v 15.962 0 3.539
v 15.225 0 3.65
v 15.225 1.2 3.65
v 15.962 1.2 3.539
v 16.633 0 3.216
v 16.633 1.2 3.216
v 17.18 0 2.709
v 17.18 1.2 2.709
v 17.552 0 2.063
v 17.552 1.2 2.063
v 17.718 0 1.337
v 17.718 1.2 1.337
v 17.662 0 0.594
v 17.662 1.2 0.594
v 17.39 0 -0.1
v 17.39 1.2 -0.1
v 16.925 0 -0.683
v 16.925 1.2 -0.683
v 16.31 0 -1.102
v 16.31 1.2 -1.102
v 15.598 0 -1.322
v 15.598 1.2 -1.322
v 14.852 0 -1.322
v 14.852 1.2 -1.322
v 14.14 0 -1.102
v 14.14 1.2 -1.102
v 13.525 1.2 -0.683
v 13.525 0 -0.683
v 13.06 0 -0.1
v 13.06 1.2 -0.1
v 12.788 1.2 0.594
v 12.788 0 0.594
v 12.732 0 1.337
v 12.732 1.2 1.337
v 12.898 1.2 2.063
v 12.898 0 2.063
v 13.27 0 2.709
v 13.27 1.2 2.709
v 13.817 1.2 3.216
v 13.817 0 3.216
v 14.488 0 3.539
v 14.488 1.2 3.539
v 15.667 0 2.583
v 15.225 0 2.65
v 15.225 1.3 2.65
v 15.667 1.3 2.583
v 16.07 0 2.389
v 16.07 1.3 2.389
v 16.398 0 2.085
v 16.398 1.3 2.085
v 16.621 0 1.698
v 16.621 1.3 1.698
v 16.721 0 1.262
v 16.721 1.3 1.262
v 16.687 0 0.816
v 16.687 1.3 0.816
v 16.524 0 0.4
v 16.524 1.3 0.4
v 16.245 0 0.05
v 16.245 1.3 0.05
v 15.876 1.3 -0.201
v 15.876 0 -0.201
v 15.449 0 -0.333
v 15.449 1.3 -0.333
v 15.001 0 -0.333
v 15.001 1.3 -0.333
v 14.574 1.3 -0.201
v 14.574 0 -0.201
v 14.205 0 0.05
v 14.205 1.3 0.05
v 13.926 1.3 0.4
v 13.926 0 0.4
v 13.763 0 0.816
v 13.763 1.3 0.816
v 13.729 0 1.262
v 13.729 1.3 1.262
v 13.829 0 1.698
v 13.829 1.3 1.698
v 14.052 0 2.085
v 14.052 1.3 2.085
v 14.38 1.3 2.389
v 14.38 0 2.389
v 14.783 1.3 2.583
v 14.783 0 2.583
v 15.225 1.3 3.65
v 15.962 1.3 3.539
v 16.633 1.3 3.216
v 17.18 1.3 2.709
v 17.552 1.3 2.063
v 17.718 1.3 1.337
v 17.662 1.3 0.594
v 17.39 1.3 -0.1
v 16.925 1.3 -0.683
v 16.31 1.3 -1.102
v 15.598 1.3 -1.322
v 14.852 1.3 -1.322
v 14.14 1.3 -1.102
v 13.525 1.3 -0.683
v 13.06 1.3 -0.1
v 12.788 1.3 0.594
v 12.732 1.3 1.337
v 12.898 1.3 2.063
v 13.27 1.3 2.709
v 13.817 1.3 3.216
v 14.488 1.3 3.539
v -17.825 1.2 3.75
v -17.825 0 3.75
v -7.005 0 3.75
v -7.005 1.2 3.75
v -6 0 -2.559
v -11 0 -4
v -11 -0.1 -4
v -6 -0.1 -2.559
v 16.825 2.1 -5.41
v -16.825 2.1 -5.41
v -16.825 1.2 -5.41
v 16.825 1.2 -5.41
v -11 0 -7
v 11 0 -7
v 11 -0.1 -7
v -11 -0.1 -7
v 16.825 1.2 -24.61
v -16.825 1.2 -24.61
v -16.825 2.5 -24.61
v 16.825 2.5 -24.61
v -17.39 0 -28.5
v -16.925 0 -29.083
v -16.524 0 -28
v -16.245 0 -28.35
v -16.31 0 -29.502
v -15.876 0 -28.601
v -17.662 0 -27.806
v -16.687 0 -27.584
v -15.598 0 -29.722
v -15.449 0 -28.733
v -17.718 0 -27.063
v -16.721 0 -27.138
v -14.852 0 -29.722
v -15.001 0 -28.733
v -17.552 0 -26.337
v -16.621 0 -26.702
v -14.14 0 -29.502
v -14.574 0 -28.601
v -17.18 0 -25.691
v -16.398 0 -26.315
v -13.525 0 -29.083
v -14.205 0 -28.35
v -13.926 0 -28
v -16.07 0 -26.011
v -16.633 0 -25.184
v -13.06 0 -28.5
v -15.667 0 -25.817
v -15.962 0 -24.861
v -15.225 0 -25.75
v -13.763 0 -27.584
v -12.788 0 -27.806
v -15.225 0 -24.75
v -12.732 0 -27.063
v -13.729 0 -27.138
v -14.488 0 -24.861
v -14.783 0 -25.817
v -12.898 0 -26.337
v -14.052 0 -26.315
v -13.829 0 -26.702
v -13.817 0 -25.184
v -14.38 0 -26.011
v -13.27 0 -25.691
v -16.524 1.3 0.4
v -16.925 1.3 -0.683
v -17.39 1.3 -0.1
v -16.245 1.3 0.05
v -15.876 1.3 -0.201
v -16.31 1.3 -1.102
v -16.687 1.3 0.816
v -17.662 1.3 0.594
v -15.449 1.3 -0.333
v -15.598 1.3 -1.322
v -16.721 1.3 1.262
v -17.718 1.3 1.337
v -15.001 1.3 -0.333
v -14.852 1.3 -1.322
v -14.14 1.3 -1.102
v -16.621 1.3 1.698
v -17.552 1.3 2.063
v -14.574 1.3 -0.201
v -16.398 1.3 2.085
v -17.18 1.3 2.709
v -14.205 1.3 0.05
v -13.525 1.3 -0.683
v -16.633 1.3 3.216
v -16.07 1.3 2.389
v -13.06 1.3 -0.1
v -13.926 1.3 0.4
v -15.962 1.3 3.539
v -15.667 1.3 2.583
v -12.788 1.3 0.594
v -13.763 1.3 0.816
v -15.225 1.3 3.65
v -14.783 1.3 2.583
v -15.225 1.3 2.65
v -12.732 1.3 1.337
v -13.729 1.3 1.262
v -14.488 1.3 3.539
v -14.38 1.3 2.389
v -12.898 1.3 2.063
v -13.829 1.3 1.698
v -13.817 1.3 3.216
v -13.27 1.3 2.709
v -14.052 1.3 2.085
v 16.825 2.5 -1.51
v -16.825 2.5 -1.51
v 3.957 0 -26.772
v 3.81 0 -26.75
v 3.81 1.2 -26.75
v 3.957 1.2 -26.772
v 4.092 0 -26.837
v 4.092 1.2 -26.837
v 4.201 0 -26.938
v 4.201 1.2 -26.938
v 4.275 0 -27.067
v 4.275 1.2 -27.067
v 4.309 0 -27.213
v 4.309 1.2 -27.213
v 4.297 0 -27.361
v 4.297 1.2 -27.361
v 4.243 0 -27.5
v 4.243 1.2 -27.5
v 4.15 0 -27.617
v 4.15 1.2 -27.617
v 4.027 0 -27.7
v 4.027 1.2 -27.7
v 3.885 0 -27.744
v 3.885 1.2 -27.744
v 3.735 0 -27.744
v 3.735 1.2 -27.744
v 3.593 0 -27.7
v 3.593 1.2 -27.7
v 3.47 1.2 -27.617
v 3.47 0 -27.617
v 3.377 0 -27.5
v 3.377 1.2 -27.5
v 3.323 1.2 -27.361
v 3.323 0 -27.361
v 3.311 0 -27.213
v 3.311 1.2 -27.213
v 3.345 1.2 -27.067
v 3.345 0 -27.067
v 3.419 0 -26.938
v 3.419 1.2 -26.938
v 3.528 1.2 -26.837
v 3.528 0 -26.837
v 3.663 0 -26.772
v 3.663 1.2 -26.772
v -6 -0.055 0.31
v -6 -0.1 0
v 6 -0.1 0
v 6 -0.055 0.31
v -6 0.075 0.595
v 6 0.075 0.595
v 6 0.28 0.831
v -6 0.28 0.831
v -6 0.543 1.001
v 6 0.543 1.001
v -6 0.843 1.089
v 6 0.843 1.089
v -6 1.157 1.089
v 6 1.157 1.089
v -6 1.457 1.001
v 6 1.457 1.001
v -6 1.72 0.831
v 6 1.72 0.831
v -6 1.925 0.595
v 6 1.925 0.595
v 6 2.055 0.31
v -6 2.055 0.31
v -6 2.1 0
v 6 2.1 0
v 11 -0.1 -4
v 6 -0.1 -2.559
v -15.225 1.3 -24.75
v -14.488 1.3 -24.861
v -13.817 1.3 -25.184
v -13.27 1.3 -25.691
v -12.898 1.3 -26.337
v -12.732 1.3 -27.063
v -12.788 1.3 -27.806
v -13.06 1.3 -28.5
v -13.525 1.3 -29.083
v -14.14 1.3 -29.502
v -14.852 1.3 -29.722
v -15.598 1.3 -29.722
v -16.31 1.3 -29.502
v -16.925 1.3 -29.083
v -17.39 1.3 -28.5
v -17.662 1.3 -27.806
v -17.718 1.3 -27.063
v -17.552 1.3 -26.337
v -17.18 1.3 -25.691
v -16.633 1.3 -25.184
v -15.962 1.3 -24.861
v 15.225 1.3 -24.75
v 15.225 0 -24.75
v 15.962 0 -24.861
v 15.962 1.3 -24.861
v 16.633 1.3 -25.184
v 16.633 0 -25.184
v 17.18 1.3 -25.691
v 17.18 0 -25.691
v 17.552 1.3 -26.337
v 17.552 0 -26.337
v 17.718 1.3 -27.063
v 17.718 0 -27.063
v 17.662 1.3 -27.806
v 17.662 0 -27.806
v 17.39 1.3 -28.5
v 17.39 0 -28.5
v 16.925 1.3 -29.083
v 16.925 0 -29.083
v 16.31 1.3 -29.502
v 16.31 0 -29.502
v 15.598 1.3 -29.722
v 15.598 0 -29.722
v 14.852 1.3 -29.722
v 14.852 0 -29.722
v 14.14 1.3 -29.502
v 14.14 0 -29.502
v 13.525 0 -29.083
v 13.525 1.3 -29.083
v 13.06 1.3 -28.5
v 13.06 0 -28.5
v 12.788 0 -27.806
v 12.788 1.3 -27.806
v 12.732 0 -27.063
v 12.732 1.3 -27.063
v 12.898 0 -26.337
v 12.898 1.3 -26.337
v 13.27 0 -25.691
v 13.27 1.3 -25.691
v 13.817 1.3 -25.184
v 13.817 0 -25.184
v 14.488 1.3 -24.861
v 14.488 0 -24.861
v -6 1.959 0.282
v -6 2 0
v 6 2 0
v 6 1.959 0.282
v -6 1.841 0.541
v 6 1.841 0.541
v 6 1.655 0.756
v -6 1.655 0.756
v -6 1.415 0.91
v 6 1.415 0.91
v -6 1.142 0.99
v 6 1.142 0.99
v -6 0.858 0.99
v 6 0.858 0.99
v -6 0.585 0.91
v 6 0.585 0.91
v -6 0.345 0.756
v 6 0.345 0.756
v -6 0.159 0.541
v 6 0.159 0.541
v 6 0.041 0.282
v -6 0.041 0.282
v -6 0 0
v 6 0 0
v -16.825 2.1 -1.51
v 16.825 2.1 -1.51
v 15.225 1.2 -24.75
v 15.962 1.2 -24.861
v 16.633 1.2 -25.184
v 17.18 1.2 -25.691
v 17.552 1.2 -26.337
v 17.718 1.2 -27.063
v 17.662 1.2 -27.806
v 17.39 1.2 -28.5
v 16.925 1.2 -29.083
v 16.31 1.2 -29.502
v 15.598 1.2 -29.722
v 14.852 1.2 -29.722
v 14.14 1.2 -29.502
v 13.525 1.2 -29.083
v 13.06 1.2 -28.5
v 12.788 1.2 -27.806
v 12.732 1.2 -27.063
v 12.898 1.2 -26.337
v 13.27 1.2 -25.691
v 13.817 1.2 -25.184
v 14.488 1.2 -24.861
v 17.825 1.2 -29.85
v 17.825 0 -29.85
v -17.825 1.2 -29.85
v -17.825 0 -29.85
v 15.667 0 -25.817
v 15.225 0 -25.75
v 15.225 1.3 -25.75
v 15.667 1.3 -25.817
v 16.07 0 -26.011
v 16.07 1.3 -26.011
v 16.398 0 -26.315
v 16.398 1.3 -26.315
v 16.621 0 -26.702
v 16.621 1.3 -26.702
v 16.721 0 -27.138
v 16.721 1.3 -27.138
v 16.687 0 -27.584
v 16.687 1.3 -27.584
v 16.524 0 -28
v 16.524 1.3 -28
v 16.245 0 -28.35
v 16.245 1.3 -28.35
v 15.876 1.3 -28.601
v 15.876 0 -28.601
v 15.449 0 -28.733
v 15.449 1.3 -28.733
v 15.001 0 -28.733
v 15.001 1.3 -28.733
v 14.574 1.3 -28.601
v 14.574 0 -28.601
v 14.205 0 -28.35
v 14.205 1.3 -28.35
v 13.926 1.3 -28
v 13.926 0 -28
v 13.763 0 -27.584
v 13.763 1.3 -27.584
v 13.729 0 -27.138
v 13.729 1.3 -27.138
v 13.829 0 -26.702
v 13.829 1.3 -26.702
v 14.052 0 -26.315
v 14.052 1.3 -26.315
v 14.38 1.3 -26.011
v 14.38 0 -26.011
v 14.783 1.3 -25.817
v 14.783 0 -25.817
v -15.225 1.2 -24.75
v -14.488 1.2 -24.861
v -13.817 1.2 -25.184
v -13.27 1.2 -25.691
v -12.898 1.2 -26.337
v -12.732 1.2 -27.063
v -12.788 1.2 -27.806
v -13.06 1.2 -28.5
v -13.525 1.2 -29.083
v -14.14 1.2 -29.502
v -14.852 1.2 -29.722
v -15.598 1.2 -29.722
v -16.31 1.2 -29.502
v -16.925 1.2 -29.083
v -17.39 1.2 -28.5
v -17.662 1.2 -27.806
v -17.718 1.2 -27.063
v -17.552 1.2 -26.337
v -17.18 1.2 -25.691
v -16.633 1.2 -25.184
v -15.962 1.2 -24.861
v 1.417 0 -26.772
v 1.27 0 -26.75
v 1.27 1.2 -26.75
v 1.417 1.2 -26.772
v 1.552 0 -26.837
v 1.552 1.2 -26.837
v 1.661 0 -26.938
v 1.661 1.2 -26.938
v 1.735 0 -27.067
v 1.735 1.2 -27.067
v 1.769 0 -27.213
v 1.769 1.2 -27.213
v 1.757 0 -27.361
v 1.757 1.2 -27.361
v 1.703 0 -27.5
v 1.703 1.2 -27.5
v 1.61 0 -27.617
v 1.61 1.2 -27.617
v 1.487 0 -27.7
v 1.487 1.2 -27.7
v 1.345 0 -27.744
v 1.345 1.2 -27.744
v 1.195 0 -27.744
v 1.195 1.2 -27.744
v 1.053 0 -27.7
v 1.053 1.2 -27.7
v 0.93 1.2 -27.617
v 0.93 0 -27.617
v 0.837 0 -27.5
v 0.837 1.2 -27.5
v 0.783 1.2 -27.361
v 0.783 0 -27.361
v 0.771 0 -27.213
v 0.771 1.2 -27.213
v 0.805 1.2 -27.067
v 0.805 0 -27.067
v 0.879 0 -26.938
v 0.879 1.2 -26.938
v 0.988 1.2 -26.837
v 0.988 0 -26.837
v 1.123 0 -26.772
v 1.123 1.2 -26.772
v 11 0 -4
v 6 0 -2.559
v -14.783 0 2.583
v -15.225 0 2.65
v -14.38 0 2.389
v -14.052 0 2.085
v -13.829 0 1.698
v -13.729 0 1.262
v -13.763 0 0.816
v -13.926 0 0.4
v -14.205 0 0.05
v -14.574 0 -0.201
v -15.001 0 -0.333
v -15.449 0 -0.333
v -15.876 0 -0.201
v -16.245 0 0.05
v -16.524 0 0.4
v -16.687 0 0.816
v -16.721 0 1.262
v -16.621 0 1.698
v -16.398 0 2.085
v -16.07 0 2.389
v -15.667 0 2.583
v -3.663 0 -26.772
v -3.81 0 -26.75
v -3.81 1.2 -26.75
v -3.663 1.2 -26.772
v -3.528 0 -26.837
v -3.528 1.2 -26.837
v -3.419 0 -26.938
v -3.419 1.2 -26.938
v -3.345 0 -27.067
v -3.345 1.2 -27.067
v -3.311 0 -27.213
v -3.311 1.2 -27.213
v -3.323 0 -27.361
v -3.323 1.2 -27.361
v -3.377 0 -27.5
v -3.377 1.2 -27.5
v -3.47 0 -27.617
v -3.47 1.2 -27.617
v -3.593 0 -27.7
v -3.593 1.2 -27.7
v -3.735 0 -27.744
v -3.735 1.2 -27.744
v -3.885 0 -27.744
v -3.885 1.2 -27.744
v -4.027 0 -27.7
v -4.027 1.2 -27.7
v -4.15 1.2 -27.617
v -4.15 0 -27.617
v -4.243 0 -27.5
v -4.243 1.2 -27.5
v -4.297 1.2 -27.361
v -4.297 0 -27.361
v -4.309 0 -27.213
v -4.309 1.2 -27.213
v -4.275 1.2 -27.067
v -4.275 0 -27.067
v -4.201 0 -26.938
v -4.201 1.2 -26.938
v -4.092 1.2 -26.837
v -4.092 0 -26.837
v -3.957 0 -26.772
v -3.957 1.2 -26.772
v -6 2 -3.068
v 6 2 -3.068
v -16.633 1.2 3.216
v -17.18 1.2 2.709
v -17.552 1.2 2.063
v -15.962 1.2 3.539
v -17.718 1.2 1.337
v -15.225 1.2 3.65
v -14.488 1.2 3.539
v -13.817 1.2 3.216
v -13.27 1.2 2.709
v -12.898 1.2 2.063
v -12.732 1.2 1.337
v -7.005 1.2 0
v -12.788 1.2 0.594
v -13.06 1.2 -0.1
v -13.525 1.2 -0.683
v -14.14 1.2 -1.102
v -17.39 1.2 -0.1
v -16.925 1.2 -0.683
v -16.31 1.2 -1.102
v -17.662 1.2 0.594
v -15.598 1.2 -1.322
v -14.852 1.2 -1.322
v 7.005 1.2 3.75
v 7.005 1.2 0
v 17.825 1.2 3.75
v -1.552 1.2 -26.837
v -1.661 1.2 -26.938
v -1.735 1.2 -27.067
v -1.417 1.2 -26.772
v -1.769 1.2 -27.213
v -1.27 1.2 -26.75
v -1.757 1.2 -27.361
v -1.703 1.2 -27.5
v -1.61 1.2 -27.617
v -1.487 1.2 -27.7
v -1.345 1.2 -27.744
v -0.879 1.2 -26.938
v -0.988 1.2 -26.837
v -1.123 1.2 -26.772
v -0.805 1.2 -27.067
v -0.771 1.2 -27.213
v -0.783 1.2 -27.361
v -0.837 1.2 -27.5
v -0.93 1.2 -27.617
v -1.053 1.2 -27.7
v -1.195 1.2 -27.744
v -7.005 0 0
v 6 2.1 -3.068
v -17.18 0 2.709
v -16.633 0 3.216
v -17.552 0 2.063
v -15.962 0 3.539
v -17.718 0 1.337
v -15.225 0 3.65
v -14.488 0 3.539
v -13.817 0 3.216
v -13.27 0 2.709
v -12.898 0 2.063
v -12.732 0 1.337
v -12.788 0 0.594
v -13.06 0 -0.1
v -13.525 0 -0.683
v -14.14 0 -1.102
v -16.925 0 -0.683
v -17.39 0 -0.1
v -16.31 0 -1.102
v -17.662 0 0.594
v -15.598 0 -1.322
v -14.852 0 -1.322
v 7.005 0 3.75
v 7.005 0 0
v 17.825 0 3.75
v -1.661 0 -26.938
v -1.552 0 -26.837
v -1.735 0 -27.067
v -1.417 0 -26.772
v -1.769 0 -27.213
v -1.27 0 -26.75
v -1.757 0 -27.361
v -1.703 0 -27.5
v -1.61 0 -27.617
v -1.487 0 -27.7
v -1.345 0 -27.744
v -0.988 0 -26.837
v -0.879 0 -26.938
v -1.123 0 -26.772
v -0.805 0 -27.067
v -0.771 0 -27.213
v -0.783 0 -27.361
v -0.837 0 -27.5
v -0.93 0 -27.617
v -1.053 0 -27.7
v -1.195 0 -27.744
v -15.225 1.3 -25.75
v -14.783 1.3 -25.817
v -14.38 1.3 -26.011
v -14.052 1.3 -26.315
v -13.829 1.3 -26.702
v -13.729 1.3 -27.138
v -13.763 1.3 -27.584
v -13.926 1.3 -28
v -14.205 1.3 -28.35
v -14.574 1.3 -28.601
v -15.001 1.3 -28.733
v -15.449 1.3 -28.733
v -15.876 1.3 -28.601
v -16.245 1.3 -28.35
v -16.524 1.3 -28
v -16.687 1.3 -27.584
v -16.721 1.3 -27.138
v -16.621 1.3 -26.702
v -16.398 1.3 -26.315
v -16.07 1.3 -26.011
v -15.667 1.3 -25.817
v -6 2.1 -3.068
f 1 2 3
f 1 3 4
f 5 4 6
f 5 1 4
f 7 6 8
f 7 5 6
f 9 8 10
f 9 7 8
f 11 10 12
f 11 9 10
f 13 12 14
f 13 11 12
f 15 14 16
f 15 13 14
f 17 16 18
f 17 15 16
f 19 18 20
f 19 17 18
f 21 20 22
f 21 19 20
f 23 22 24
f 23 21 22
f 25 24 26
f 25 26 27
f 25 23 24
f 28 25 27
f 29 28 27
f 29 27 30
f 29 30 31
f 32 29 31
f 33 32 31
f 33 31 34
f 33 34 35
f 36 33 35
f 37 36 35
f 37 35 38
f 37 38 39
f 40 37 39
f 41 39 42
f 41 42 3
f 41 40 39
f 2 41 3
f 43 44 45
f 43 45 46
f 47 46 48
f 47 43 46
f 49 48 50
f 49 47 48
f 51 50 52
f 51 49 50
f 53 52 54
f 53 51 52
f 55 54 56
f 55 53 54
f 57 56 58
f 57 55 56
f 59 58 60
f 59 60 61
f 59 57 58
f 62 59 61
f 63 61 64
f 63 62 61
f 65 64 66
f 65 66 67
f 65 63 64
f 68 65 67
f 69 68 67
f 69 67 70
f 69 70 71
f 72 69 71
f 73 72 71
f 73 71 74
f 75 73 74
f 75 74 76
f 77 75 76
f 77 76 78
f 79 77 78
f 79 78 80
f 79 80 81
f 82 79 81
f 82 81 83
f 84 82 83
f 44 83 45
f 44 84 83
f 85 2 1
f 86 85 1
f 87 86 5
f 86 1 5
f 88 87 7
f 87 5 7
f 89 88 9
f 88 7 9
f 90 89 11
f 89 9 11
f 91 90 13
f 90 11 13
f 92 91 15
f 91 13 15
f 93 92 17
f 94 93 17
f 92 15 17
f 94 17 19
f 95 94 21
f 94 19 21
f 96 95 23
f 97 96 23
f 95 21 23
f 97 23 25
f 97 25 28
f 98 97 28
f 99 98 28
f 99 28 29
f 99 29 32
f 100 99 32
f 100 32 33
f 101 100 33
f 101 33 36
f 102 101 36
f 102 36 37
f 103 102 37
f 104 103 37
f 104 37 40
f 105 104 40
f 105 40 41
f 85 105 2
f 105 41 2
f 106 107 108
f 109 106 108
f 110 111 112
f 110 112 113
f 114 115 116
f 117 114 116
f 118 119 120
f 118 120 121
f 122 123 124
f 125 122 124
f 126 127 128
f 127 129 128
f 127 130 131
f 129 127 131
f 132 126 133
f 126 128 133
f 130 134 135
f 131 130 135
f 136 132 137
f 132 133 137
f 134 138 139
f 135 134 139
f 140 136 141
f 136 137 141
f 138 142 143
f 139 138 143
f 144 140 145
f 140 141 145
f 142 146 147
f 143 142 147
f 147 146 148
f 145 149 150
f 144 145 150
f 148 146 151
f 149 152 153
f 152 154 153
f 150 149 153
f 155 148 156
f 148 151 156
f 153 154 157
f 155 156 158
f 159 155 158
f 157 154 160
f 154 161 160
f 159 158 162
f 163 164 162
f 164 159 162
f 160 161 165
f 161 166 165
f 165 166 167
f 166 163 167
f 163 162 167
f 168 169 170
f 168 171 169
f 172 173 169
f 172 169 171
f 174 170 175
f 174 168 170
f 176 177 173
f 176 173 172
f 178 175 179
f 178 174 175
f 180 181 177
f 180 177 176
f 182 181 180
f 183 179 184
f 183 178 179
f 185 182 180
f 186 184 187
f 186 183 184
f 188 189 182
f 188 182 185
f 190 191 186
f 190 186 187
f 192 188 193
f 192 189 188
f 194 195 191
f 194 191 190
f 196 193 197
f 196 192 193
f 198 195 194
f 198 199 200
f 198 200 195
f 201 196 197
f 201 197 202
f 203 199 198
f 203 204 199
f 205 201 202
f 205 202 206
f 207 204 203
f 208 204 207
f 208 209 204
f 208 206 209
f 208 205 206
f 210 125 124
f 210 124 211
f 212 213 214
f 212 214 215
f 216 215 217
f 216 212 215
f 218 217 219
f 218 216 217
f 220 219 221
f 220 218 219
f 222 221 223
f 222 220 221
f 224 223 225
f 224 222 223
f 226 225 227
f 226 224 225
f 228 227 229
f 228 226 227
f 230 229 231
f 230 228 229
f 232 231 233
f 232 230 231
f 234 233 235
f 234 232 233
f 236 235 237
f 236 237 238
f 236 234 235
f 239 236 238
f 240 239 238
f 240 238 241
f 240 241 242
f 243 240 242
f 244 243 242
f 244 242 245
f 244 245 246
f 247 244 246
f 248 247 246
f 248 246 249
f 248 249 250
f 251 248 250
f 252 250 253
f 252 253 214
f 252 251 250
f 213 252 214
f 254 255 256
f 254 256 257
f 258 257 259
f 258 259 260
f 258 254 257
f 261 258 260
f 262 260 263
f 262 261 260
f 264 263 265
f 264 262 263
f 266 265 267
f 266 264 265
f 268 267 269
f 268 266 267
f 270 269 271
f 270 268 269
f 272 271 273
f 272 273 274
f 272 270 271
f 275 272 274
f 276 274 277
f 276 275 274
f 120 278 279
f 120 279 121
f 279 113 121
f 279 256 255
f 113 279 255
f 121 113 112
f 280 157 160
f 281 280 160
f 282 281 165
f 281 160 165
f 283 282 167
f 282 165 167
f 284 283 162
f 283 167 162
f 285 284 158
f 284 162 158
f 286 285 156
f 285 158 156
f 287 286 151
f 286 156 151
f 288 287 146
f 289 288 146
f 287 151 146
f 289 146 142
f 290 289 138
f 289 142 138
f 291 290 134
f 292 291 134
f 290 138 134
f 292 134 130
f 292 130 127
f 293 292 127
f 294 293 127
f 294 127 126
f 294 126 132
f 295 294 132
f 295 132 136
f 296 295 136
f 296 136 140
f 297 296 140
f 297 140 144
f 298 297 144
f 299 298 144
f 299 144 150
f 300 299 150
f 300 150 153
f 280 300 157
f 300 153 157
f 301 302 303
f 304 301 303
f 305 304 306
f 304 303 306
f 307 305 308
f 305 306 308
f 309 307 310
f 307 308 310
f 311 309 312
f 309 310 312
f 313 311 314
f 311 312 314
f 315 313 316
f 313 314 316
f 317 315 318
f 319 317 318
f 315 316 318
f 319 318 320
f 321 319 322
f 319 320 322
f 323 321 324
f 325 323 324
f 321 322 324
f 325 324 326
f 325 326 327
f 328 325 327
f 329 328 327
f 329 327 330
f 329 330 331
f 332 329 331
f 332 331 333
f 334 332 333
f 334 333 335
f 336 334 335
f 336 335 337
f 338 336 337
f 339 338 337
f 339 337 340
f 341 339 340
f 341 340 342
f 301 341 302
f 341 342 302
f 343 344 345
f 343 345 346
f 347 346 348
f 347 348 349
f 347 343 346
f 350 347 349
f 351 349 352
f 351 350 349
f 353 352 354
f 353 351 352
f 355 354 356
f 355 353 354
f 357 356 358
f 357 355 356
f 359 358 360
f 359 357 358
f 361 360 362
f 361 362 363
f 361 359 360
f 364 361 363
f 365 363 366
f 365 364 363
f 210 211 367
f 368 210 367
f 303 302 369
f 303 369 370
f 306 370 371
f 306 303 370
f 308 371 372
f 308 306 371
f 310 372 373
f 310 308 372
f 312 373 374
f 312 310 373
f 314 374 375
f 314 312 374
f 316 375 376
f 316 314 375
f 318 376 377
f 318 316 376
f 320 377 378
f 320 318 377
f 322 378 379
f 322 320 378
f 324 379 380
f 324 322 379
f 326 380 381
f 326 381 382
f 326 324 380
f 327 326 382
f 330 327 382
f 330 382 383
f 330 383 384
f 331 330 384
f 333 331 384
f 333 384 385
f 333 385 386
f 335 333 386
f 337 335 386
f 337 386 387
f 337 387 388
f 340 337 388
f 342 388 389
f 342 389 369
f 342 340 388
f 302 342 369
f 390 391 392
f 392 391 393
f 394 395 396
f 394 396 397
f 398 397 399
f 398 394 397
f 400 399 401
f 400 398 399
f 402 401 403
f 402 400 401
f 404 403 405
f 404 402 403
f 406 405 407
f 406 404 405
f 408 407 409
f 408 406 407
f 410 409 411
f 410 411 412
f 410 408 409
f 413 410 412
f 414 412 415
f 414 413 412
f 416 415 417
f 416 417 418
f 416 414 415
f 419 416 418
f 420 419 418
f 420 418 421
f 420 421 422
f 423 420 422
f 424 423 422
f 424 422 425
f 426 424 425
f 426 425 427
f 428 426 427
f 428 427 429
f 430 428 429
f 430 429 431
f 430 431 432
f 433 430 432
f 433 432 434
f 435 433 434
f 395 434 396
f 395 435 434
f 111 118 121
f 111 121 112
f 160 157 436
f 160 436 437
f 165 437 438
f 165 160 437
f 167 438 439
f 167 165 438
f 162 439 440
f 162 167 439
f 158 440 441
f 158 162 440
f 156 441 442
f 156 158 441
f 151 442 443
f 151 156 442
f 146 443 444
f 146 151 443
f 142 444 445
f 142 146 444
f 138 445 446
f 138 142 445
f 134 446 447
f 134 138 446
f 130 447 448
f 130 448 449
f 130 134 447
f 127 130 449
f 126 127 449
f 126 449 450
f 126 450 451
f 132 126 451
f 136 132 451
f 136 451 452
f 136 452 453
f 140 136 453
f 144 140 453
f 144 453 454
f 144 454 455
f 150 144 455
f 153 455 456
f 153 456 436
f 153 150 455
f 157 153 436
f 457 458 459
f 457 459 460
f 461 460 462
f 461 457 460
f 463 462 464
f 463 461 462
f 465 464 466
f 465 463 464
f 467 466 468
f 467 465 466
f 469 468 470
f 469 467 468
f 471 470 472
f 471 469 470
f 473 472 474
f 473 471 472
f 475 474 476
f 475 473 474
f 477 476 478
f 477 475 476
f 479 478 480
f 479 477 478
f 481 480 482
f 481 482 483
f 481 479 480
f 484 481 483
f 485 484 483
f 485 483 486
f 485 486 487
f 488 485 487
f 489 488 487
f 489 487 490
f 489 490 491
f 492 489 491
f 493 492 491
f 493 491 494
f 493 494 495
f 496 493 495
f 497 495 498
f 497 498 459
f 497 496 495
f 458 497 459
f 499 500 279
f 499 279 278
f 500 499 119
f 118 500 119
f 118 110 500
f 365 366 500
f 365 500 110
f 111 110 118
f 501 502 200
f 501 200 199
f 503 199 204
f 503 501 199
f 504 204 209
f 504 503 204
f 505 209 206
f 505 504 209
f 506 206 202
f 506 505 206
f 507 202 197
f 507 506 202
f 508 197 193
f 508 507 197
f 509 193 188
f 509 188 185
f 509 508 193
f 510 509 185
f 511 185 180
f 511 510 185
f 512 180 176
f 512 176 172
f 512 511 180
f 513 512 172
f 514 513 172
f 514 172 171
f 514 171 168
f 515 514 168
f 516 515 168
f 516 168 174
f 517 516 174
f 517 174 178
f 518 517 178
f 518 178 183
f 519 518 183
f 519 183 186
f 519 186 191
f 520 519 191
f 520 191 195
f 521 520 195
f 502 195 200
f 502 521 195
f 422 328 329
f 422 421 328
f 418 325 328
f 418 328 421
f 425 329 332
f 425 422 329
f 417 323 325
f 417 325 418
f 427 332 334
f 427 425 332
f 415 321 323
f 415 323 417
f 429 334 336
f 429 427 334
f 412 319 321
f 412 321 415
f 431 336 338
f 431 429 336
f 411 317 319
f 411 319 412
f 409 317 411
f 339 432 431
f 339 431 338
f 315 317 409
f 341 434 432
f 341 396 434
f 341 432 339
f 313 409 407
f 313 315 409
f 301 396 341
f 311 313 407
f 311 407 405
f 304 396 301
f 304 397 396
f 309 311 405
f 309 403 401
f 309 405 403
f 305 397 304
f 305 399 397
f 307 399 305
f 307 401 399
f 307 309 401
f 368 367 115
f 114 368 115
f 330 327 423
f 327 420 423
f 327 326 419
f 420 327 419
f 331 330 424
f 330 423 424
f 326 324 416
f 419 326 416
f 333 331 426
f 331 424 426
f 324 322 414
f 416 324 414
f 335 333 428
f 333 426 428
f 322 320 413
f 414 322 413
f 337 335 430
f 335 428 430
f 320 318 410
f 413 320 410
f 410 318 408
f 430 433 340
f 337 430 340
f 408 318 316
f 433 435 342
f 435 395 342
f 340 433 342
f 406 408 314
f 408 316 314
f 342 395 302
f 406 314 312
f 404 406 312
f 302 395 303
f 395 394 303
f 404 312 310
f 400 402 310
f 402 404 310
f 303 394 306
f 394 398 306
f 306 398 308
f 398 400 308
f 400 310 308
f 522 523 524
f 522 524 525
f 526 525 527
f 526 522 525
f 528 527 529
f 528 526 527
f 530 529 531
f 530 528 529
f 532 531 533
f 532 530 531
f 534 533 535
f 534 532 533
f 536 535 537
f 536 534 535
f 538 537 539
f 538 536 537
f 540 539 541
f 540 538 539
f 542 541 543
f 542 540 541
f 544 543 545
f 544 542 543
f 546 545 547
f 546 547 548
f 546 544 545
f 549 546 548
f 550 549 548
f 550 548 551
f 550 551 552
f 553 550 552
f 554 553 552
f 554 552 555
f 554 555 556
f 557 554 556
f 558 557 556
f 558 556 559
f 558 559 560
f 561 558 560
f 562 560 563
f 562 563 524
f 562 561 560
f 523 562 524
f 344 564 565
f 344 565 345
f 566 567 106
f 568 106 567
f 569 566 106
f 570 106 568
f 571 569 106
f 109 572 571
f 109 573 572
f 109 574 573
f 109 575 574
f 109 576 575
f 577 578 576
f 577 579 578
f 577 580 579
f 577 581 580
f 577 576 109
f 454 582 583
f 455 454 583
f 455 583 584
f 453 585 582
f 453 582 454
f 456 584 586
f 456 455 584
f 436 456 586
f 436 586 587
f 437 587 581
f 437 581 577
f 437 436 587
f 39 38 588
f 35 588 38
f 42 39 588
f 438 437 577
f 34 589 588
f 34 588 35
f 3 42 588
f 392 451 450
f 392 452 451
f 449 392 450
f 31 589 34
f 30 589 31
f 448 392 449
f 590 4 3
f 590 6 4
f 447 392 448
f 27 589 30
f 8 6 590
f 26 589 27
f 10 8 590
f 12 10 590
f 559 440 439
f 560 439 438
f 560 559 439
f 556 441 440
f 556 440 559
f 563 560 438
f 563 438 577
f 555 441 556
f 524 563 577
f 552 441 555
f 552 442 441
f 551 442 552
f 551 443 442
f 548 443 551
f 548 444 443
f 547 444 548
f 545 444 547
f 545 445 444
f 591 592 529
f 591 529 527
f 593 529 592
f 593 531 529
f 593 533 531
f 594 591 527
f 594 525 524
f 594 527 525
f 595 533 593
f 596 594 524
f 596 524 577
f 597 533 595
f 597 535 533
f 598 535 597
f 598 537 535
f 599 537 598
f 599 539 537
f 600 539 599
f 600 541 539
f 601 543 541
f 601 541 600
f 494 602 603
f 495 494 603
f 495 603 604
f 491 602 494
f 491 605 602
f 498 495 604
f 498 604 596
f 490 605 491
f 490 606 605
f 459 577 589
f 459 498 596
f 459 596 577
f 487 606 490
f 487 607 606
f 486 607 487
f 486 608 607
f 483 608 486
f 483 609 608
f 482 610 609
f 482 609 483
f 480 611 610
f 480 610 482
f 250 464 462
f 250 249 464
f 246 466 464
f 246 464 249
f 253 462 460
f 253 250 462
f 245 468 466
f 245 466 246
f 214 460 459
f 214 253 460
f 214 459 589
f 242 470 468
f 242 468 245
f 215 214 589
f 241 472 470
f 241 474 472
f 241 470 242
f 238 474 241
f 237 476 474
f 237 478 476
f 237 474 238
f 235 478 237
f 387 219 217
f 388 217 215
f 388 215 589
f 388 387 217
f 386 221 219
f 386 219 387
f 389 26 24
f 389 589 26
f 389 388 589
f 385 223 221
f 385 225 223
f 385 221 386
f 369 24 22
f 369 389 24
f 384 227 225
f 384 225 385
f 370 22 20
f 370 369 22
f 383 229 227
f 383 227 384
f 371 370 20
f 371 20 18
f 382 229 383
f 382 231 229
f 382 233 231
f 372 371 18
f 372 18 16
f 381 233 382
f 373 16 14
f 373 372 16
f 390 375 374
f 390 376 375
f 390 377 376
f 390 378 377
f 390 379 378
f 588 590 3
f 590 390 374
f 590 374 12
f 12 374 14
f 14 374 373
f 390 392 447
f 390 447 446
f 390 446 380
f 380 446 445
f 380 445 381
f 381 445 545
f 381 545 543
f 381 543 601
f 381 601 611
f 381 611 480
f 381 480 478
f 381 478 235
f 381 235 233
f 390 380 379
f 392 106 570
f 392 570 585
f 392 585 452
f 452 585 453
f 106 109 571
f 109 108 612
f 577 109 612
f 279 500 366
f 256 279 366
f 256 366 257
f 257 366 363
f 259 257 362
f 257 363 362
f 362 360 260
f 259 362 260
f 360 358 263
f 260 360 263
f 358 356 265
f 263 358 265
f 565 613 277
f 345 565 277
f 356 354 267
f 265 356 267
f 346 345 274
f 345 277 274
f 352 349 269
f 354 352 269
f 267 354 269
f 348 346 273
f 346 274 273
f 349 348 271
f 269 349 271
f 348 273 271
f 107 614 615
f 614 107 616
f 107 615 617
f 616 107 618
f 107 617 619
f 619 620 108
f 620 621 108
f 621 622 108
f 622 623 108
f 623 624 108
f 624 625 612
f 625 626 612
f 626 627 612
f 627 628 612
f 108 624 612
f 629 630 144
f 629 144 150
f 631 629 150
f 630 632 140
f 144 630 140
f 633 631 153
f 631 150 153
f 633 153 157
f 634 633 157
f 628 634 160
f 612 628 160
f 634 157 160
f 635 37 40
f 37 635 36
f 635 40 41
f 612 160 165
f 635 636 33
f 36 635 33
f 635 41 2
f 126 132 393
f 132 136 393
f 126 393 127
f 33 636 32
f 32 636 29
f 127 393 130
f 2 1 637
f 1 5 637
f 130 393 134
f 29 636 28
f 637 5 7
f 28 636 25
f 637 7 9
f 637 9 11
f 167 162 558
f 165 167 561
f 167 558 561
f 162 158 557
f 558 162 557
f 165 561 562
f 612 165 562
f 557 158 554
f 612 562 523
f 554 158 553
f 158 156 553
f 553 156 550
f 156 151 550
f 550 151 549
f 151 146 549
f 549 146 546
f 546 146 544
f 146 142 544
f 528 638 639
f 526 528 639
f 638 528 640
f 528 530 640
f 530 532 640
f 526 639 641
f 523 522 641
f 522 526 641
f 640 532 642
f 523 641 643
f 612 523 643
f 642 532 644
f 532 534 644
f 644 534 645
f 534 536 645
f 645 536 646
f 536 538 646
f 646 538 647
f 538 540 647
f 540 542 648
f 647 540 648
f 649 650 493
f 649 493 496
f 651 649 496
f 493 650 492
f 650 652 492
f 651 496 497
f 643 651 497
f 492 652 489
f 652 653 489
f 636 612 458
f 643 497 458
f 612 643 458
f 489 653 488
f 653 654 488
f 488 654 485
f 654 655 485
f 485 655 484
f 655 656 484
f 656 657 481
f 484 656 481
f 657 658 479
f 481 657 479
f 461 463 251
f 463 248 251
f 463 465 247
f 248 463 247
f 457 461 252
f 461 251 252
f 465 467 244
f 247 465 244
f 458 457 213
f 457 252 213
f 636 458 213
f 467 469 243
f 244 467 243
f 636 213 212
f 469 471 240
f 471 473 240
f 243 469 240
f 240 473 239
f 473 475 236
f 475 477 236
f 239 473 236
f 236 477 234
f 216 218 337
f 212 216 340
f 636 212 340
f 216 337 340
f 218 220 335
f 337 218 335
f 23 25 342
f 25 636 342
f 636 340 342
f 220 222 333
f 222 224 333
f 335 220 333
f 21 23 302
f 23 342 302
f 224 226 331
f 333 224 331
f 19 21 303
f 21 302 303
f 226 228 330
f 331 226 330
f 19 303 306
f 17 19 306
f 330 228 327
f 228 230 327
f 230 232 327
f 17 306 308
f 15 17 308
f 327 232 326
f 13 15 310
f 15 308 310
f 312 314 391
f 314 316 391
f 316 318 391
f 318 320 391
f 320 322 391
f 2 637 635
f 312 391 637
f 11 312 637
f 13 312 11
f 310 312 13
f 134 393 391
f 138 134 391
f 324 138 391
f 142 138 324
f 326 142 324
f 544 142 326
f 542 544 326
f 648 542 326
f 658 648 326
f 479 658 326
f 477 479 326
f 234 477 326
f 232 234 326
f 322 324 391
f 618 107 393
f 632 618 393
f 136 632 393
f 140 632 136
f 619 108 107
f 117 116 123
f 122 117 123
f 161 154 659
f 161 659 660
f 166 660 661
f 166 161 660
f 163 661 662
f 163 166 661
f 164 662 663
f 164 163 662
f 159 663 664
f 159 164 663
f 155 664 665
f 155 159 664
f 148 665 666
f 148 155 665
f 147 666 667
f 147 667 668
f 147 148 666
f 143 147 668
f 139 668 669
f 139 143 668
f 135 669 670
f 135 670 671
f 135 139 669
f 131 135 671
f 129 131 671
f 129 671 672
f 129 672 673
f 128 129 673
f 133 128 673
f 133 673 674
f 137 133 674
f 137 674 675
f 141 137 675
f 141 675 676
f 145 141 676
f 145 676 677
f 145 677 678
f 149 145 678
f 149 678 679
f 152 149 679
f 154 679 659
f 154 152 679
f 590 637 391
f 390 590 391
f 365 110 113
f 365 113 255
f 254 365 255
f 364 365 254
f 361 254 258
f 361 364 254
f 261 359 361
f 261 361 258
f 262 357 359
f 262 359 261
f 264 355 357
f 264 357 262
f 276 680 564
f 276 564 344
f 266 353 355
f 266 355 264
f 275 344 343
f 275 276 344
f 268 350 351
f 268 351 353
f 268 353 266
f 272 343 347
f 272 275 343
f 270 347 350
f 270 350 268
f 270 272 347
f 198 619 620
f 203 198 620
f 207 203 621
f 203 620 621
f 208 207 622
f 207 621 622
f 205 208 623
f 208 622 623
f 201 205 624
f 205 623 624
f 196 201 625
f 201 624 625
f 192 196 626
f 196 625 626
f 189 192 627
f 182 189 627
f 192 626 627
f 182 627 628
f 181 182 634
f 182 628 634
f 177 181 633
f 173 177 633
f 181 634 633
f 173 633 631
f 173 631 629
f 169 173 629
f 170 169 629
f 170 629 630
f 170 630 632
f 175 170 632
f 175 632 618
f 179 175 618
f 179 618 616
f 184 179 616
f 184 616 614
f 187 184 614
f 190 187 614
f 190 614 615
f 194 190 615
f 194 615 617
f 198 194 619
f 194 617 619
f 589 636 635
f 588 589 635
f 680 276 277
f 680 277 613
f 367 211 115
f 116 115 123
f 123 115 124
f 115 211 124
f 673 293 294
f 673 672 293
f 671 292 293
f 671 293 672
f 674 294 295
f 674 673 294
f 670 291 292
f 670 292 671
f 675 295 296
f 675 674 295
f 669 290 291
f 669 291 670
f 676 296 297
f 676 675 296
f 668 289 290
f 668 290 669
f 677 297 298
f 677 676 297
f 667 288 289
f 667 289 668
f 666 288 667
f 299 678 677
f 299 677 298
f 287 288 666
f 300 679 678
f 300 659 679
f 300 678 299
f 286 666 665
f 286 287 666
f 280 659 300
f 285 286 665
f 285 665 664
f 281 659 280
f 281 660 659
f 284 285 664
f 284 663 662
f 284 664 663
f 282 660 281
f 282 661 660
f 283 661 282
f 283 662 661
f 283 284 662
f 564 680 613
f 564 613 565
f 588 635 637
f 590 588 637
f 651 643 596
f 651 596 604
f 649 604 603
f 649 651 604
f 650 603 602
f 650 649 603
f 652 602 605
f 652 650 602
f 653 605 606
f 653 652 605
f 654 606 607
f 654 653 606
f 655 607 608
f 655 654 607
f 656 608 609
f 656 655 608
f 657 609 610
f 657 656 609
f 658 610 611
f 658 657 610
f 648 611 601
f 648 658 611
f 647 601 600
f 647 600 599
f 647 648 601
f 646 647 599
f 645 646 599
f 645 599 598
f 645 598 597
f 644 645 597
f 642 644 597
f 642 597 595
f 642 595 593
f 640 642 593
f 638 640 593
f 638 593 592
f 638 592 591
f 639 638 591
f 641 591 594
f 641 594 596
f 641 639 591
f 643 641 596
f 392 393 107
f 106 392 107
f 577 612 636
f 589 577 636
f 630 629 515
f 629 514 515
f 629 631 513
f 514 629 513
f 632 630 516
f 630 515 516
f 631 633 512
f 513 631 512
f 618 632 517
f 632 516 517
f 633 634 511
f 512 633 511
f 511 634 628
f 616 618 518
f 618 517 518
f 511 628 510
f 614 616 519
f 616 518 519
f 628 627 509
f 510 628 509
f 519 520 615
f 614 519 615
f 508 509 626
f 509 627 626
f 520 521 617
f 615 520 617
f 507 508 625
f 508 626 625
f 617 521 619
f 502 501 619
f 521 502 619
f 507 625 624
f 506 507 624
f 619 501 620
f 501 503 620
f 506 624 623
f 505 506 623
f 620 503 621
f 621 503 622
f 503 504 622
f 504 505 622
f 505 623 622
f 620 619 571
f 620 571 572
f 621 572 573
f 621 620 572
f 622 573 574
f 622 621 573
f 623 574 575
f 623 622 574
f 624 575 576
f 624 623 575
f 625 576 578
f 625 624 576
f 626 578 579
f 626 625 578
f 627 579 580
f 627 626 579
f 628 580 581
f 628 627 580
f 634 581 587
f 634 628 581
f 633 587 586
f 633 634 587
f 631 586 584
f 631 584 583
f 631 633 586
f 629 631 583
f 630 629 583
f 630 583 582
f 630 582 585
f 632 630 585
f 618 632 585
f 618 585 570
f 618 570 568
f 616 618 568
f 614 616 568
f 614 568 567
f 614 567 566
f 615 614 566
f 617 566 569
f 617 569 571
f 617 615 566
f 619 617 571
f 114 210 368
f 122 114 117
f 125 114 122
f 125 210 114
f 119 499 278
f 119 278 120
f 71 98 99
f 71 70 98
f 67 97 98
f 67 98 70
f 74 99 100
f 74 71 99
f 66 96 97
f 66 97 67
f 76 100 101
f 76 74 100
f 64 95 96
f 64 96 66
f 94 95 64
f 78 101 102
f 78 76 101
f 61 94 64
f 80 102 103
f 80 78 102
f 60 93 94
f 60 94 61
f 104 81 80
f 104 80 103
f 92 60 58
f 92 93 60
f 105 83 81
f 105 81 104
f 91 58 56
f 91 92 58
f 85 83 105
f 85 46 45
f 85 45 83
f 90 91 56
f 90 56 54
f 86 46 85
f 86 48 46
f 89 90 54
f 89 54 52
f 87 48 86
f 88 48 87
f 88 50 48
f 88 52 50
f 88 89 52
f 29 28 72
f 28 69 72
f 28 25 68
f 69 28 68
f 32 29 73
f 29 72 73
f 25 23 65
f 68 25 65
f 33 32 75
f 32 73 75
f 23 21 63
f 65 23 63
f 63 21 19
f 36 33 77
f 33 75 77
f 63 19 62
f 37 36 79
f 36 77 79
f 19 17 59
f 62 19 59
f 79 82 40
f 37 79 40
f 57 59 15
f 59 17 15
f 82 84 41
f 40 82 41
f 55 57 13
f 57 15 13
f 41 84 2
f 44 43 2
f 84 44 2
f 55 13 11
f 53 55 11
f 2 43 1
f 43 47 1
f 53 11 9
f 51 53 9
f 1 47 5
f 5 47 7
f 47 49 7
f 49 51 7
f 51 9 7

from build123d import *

# Parameters (mm, degrees)
CROQUIS1_R                     = 2.5
CROQUIS1_R_2                   = 0.5
SALIENTE_EXTRUIR1_DEPTH        = 1.2
SALIENTE_EXTRUIR2_DEPTH        = 0.1
SALIENTE_EXTRUIR2_DEPTH_BACK   = 1.2
CROQUIS2_R                     = 2.5
CROQUIS2_R_2                   = 1.5
SALIENTE_EXTRUIR2_2_DEPTH      = 0.1
SALIENTE_EXTRUIR2_2_DEPTH_BACK = 1.2
SALIENTE_EXTRUIR2_3_DEPTH      = 0.1
SALIENTE_EXTRUIR2_3_DEPTH_BACK = 1.2
SALIENTE_EXTRUIR2_4_DEPTH      = 0.1
SALIENTE_EXTRUIR2_4_DEPTH_BACK = 1.2
SALIENTE_EXTRUIR3_DEPTH        = 16.825
SALIENTE_EXTRUIR3_DEPTH_BACK   = 16.825
SALIENTE_EXTRUIR4_DEPTH        = 0.1
SALIENTE_EXTRUIR5_DEPTH        = 6
SALIENTE_EXTRUIR5_DEPTH_BACK   = 6


with BuildPart() as part:
    # Croquis1 → Saliente-Extruir1 (new body)
    with BuildSketch(Plane(origin=(0, 0, 0), x_dir=(1, 0, 0), z_dir=(0, 1, 0))):
        Polygon((-7.005, 0), (7.005, 0), (7.005, -3.75), (17.825, -3.75), (17.825, 29.85), (-17.825, 29.85), (-17.825, -3.75), (-7.005, -3.75), align=None)
        with Locations(Location((-15.225, 27.25, 0), (0, 0, 270))):
            Circle(CROQUIS1_R, mode=Mode.SUBTRACT)
        with Locations(Location((15.225, 27.25, 0), (0, 0, 270))):
            Circle(CROQUIS1_R, mode=Mode.SUBTRACT)
        with Locations(Location((-15.225, -1.15, 0), (0, 0, 270))):
            Circle(CROQUIS1_R, mode=Mode.SUBTRACT)
        with Locations(Location((15.225, -1.15, 0), (0, 0, 270))):
            Circle(CROQUIS1_R, mode=Mode.SUBTRACT)
        with Locations(Location((-1.27, 27.25, 0), (0, 0, 270))):
            Circle(CROQUIS1_R_2, mode=Mode.SUBTRACT)
        with Locations(Location((-3.81, 27.25, 0), (0, 0, 270))):
            Circle(CROQUIS1_R_2, mode=Mode.SUBTRACT)
        with Locations(Location((1.27, 27.25, 0), (0, 0, 270))):
            Circle(CROQUIS1_R_2, mode=Mode.SUBTRACT)
        with Locations(Location((3.81, 27.25, 0), (0, 0, 270))):
            Circle(CROQUIS1_R_2, mode=Mode.SUBTRACT)
    extrude(amount=SALIENTE_EXTRUIR1_DEPTH)


with BuildPart() as body_2:
    # Croquis2 → Saliente-Extruir2 (new, two sides: drawn at the far end of the back side and taken through both)
    with BuildSketch(Plane(origin=(0, 1.2, 0), x_dir=(1, 0, 0), z_dir=(0, 1, 0)).offset(-SALIENTE_EXTRUIR2_DEPTH_BACK)):
        with Locations(Location((-15.225, 27.25, 0), (0, 0, 270))):
            Circle(CROQUIS2_R)
        with Locations(Location((-15.225, 27.25, 0), (0, 0, 270))):
            Circle(CROQUIS2_R_2, mode=Mode.SUBTRACT)
    extrude(amount=SALIENTE_EXTRUIR2_DEPTH + SALIENTE_EXTRUIR2_DEPTH_BACK)


with BuildPart() as body_3:
    # Croquis2 → Saliente-Extruir2 2 (new, two sides: drawn at the far end of the back side and taken through both)
    with BuildSketch(Plane(origin=(0, 1.2, 0), x_dir=(1, 0, 0), z_dir=(0, 1, 0)).offset(-SALIENTE_EXTRUIR2_2_DEPTH_BACK)):
        with Locations(Location((15.225, 27.25, 0), (0, 0, 270))):
            Circle(CROQUIS2_R)
        with Locations(Location((15.225, 27.25, 0), (0, 0, 270))):
            Circle(CROQUIS2_R_2, mode=Mode.SUBTRACT)
    extrude(amount=SALIENTE_EXTRUIR2_2_DEPTH + SALIENTE_EXTRUIR2_2_DEPTH_BACK)


with BuildPart() as body_4:
    # Croquis2 → Saliente-Extruir2 3 (new, two sides: drawn at the far end of the back side and taken through both)
    with BuildSketch(Plane(origin=(0, 1.2, 0), x_dir=(1, 0, 0), z_dir=(0, 1, 0)).offset(-SALIENTE_EXTRUIR2_3_DEPTH_BACK)):
        with Locations(Location((-15.225, -1.15, 0), (0, 0, 270))):
            Circle(CROQUIS2_R)
        with Locations(Location((-15.225, -1.15, 0), (0, 0, 270))):
            Circle(CROQUIS2_R_2, mode=Mode.SUBTRACT)
    extrude(amount=SALIENTE_EXTRUIR2_3_DEPTH + SALIENTE_EXTRUIR2_3_DEPTH_BACK)


with BuildPart() as body_5:
    # Croquis2 → Saliente-Extruir2 4 (new, two sides: drawn at the far end of the back side and taken through both)
    with BuildSketch(Plane(origin=(0, 1.2, 0), x_dir=(1, 0, 0), z_dir=(0, 1, 0)).offset(-SALIENTE_EXTRUIR2_4_DEPTH_BACK)):
        with Locations(Location((15.225, -1.15, 0), (0, 0, 270))):
            Circle(CROQUIS2_R)
        with Locations(Location((15.225, -1.15, 0), (0, 0, 270))):
            Circle(CROQUIS2_R_2, mode=Mode.SUBTRACT)
    extrude(amount=SALIENTE_EXTRUIR2_4_DEPTH + SALIENTE_EXTRUIR2_4_DEPTH_BACK)


with BuildPart() as body_6:
    # Croquis3 → Saliente-Extruir3 (new, two sides: drawn at the far end of the back side and taken through both)
    with BuildSketch(Plane(origin=(0, 0, 0), x_dir=(0, 0, -1), z_dir=(1, 0, 0)).offset(-SALIENTE_EXTRUIR3_DEPTH_BACK)):
        Polygon((24.61, 1.2), (24.61, 2.5), (1.51, 2.5), (1.51, 2.1), (5.41, 2.1), (5.41, 1.2), align=None)
    extrude(amount=SALIENTE_EXTRUIR3_DEPTH + SALIENTE_EXTRUIR3_DEPTH_BACK)


with BuildPart() as body_7:
    # Croquis4 → Saliente-Extruir4 (new body)
    with BuildSketch(Plane.XZ):
        Polygon((11, -7), (-11, -7), (-11, -4), (-6, -2.55853536), (-6, 0), (6, 0), (6, -2.55853536), (11, -4), align=None)
    extrude(amount=SALIENTE_EXTRUIR4_DEPTH)

    # Croquis5 → Saliente-Extruir5 (add, two sides: drawn at the far end of the back side and taken through both)
    with BuildSketch(Plane(origin=(0, 0, 0), x_dir=(0, 0, -1), z_dir=(1, 0, 0)).offset(-SALIENTE_EXTRUIR5_DEPTH_BACK)):
        with BuildLine():
            Line((1.51, 2.1), (3.068443588, 2.1))
            Line((3.068443588, 2.1), (3.068443588, 2))
            Line((3.068443588, 2), (1.51, 2))
            Line((1.51, 2), (0, 2))
            ThreePointArc((0, 2), (-1, 1), (0, 0))
            Line((0, 0), (0, -0.1))
            ThreePointArc((0, -0.1), (-1.1, 1), (0, 2.1))
            Line((0, 2.1), (1.51, 2.1))
        make_face()
    extrude(amount=SALIENTE_EXTRUIR5_DEPTH + SALIENTE_EXTRUIR5_DEPTH_BACK)


solid = Compound([part.part, body_2.part, body_3.part, body_4.part, body_5.part, body_6.part, body_7.part])
